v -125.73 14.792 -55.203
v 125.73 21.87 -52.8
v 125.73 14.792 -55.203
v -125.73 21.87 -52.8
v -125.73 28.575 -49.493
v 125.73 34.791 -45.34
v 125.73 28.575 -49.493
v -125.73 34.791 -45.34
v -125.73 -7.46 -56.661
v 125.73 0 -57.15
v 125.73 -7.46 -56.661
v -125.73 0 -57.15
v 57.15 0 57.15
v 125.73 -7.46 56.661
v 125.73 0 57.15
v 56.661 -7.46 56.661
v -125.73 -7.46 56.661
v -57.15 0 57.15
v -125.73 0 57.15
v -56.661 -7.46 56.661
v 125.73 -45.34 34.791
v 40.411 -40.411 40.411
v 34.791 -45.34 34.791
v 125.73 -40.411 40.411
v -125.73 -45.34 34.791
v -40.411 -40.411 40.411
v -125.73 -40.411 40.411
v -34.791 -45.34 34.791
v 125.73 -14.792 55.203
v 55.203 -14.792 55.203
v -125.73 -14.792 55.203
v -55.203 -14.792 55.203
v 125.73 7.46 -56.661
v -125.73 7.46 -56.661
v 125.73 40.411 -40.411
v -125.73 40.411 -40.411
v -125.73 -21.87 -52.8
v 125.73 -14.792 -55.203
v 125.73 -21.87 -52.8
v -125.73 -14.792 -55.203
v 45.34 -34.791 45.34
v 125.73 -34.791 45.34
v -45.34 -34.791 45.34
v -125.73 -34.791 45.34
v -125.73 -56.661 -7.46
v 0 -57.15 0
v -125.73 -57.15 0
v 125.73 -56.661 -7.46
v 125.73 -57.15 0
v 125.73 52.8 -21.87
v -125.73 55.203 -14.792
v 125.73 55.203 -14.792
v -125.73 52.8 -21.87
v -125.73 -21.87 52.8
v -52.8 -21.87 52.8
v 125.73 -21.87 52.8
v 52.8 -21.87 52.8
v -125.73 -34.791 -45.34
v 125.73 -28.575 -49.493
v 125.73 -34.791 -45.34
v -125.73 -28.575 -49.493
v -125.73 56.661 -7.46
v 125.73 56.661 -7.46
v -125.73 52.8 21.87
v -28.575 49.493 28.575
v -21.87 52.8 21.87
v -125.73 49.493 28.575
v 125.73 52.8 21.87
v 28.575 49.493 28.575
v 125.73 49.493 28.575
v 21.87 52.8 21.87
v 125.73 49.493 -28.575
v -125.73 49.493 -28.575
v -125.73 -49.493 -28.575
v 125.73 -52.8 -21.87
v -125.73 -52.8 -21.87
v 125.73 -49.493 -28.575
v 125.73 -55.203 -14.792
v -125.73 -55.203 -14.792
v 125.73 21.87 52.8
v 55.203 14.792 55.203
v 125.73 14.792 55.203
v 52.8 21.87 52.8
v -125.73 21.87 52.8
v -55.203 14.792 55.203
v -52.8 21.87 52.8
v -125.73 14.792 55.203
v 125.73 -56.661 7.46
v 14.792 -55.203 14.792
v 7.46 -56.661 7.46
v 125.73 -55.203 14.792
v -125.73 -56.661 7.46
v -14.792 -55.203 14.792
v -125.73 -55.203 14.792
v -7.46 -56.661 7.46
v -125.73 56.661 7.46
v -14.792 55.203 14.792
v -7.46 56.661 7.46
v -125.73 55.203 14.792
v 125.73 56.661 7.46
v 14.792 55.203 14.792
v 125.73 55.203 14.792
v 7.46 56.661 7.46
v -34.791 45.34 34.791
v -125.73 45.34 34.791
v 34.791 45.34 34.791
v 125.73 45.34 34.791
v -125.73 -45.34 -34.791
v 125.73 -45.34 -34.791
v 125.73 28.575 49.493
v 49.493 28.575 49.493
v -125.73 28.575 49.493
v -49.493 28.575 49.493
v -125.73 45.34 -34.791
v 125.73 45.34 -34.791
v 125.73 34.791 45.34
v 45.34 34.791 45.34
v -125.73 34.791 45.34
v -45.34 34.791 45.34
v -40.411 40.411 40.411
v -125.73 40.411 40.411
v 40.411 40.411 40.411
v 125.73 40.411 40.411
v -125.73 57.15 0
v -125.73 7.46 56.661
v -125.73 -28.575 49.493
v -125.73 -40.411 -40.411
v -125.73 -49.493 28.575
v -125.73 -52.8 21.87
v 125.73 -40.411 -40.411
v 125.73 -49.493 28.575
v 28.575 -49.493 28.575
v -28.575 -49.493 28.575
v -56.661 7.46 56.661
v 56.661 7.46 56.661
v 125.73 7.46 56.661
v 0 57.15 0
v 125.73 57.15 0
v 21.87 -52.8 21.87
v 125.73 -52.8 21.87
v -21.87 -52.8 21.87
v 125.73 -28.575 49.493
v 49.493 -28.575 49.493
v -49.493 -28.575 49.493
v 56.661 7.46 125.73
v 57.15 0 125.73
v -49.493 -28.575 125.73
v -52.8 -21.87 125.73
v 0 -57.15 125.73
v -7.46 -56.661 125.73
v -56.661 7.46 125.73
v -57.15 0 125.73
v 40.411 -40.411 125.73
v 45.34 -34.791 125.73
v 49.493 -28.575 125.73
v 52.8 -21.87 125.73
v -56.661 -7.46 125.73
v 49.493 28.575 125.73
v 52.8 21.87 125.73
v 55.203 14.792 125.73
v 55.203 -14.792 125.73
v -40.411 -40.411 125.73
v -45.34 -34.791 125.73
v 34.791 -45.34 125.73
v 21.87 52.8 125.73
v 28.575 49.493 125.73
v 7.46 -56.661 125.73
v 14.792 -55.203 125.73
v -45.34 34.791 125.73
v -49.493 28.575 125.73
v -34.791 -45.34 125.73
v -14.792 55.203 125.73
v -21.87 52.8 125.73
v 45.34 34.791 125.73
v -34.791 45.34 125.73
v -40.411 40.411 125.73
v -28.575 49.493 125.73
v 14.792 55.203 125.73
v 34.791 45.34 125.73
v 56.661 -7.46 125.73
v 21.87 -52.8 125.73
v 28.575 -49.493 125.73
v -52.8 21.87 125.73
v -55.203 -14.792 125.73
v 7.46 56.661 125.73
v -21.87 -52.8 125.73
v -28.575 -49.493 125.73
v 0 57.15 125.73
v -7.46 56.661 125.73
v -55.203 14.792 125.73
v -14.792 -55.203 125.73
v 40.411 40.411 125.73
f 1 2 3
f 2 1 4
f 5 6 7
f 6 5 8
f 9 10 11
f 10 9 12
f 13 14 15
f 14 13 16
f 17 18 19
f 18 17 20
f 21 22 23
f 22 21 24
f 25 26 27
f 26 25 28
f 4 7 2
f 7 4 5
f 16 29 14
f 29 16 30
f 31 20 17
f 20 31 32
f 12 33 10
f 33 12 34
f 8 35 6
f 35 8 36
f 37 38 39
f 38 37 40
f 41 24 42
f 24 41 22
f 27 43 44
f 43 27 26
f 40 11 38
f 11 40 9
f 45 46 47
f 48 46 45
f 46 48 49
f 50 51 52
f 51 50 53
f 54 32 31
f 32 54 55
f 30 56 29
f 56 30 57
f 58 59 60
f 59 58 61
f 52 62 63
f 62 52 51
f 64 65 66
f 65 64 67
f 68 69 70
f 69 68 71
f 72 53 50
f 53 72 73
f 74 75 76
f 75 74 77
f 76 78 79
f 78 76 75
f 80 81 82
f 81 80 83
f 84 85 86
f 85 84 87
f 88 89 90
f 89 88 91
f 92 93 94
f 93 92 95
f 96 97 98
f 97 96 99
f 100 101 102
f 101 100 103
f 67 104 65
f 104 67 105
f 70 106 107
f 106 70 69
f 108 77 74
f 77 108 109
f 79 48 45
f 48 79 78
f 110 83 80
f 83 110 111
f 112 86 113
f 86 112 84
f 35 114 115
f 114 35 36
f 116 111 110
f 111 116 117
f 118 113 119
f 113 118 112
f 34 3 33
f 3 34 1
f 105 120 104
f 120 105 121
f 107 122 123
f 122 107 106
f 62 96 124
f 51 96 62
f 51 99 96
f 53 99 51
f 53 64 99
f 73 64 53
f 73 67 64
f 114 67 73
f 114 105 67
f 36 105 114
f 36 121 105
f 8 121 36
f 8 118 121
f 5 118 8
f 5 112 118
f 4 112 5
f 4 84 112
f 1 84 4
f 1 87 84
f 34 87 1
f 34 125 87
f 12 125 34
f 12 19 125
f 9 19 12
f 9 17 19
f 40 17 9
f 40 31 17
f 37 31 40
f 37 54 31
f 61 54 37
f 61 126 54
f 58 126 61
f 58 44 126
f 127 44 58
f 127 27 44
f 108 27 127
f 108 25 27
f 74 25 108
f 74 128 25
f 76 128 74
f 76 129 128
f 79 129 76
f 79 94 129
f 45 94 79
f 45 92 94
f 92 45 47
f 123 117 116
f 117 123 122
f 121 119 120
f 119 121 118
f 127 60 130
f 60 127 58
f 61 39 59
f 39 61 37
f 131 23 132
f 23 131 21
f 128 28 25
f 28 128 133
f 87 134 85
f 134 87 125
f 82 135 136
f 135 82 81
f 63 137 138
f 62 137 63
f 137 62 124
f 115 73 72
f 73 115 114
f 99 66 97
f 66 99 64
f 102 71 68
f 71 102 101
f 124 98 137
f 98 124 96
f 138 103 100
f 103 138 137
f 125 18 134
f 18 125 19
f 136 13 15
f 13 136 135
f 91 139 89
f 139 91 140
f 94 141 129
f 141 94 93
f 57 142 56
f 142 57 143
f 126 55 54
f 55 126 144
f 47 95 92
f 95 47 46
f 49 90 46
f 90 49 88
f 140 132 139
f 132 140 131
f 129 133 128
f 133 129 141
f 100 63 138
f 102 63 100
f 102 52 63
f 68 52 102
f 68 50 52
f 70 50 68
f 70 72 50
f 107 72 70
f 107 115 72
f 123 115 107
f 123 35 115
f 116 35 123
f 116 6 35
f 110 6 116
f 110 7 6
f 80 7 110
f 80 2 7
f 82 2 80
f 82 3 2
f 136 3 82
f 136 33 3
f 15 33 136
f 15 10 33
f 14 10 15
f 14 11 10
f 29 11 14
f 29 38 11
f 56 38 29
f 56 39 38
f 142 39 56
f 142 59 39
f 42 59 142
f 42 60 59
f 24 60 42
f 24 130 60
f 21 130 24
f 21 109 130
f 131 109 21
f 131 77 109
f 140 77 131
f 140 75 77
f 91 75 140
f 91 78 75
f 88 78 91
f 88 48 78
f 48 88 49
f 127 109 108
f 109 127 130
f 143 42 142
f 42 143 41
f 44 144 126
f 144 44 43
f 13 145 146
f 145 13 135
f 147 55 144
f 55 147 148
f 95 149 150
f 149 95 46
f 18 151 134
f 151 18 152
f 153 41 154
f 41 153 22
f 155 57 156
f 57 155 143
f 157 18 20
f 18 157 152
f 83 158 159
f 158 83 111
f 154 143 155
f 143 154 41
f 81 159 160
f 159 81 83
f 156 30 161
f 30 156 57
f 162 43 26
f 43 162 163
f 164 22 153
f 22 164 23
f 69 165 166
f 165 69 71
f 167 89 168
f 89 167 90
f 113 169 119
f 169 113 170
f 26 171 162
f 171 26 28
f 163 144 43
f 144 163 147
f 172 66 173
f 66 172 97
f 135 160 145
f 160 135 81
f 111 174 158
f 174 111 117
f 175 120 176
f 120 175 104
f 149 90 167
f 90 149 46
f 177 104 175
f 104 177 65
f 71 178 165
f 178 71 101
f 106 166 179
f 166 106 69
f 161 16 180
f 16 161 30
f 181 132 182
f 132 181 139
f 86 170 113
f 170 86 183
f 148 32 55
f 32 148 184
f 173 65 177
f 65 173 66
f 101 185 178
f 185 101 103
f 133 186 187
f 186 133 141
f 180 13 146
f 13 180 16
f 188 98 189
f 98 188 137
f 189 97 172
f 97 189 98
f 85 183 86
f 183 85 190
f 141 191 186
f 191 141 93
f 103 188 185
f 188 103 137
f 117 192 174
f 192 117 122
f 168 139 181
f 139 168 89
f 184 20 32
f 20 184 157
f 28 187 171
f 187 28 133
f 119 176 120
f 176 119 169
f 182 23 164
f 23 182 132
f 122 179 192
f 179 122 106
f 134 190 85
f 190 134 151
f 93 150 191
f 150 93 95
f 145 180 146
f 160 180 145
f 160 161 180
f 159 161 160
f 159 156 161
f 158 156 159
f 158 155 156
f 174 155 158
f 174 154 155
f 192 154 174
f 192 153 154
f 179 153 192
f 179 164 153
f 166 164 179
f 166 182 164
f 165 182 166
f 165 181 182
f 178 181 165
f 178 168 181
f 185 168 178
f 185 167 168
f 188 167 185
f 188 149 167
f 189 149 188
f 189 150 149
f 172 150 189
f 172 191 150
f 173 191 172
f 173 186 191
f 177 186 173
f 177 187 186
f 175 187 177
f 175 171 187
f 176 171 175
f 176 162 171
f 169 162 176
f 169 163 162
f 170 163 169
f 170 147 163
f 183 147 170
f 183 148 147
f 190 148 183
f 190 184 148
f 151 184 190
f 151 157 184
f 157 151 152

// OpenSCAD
// Auto-generated by scripts/author_from_manifest.py (Phase D.3).
// Source: data/phase_d_manifest.json (sku_intent='anvil-reducing-tee-threaded-4x2in').
// Do not hand-edit — regenerate from the manifest.
//
// @part anvil_reducing_tee_threaded_4x2in
// @kind fitting
// @category fitting.tee
// @display-name "Anvil FIG 10 Threaded Reducing Tee 4\" x 2\""
// @mfg anvil_international
// @mfg-pn FIG_10_4x2
// @listing UL FM
// @price-usd 34.00
// @install-minutes 6
// @crew journeyman
// @param size_in number default=4 label="Size" unit="in"
// @port run_in position=[-0.05,0,0] direction=[-1,0,0] style=grooved size_in=4 role=run_a
// @port run_out position=[0.05,0,0] direction=[1,0,0] style=grooved size_in=4 role=run_b
// @port branch position=[0,0,0.05] direction=[0,0,1] style=grooved size_in=4 role=branch

size_in = 4.0;

function od_mm(nps) =
    nps ==   1  ? 33.4 :
    nps == 1.25 ? 42.2 :
    nps == 1.5  ? 48.3 :
    nps ==   2  ? 60.3 :
    nps == 2.5  ? 73.0 :
    nps ==   3  ? 88.9 :
    nps ==   4  ? 114.3 :
    nps ==   5  ? 141.3 :
    nps ==   6  ? 168.3 :
    nps ==   8  ? 219.1 :
    nps ==  10  ? 273.0 : 60.3;

od = od_mm(size_in);
run_len    = od * 2.2;
branch_len = od * 1.1;

union() {
    // Run along X
    rotate([0, 90, 0])
        cylinder(h = run_len, d = od, center = true, $fn = 48);
    // Branch along +Z
    translate([0, 0, branch_len/2])
        cylinder(h = branch_len, d = od, center = true, $fn = 48);
}
